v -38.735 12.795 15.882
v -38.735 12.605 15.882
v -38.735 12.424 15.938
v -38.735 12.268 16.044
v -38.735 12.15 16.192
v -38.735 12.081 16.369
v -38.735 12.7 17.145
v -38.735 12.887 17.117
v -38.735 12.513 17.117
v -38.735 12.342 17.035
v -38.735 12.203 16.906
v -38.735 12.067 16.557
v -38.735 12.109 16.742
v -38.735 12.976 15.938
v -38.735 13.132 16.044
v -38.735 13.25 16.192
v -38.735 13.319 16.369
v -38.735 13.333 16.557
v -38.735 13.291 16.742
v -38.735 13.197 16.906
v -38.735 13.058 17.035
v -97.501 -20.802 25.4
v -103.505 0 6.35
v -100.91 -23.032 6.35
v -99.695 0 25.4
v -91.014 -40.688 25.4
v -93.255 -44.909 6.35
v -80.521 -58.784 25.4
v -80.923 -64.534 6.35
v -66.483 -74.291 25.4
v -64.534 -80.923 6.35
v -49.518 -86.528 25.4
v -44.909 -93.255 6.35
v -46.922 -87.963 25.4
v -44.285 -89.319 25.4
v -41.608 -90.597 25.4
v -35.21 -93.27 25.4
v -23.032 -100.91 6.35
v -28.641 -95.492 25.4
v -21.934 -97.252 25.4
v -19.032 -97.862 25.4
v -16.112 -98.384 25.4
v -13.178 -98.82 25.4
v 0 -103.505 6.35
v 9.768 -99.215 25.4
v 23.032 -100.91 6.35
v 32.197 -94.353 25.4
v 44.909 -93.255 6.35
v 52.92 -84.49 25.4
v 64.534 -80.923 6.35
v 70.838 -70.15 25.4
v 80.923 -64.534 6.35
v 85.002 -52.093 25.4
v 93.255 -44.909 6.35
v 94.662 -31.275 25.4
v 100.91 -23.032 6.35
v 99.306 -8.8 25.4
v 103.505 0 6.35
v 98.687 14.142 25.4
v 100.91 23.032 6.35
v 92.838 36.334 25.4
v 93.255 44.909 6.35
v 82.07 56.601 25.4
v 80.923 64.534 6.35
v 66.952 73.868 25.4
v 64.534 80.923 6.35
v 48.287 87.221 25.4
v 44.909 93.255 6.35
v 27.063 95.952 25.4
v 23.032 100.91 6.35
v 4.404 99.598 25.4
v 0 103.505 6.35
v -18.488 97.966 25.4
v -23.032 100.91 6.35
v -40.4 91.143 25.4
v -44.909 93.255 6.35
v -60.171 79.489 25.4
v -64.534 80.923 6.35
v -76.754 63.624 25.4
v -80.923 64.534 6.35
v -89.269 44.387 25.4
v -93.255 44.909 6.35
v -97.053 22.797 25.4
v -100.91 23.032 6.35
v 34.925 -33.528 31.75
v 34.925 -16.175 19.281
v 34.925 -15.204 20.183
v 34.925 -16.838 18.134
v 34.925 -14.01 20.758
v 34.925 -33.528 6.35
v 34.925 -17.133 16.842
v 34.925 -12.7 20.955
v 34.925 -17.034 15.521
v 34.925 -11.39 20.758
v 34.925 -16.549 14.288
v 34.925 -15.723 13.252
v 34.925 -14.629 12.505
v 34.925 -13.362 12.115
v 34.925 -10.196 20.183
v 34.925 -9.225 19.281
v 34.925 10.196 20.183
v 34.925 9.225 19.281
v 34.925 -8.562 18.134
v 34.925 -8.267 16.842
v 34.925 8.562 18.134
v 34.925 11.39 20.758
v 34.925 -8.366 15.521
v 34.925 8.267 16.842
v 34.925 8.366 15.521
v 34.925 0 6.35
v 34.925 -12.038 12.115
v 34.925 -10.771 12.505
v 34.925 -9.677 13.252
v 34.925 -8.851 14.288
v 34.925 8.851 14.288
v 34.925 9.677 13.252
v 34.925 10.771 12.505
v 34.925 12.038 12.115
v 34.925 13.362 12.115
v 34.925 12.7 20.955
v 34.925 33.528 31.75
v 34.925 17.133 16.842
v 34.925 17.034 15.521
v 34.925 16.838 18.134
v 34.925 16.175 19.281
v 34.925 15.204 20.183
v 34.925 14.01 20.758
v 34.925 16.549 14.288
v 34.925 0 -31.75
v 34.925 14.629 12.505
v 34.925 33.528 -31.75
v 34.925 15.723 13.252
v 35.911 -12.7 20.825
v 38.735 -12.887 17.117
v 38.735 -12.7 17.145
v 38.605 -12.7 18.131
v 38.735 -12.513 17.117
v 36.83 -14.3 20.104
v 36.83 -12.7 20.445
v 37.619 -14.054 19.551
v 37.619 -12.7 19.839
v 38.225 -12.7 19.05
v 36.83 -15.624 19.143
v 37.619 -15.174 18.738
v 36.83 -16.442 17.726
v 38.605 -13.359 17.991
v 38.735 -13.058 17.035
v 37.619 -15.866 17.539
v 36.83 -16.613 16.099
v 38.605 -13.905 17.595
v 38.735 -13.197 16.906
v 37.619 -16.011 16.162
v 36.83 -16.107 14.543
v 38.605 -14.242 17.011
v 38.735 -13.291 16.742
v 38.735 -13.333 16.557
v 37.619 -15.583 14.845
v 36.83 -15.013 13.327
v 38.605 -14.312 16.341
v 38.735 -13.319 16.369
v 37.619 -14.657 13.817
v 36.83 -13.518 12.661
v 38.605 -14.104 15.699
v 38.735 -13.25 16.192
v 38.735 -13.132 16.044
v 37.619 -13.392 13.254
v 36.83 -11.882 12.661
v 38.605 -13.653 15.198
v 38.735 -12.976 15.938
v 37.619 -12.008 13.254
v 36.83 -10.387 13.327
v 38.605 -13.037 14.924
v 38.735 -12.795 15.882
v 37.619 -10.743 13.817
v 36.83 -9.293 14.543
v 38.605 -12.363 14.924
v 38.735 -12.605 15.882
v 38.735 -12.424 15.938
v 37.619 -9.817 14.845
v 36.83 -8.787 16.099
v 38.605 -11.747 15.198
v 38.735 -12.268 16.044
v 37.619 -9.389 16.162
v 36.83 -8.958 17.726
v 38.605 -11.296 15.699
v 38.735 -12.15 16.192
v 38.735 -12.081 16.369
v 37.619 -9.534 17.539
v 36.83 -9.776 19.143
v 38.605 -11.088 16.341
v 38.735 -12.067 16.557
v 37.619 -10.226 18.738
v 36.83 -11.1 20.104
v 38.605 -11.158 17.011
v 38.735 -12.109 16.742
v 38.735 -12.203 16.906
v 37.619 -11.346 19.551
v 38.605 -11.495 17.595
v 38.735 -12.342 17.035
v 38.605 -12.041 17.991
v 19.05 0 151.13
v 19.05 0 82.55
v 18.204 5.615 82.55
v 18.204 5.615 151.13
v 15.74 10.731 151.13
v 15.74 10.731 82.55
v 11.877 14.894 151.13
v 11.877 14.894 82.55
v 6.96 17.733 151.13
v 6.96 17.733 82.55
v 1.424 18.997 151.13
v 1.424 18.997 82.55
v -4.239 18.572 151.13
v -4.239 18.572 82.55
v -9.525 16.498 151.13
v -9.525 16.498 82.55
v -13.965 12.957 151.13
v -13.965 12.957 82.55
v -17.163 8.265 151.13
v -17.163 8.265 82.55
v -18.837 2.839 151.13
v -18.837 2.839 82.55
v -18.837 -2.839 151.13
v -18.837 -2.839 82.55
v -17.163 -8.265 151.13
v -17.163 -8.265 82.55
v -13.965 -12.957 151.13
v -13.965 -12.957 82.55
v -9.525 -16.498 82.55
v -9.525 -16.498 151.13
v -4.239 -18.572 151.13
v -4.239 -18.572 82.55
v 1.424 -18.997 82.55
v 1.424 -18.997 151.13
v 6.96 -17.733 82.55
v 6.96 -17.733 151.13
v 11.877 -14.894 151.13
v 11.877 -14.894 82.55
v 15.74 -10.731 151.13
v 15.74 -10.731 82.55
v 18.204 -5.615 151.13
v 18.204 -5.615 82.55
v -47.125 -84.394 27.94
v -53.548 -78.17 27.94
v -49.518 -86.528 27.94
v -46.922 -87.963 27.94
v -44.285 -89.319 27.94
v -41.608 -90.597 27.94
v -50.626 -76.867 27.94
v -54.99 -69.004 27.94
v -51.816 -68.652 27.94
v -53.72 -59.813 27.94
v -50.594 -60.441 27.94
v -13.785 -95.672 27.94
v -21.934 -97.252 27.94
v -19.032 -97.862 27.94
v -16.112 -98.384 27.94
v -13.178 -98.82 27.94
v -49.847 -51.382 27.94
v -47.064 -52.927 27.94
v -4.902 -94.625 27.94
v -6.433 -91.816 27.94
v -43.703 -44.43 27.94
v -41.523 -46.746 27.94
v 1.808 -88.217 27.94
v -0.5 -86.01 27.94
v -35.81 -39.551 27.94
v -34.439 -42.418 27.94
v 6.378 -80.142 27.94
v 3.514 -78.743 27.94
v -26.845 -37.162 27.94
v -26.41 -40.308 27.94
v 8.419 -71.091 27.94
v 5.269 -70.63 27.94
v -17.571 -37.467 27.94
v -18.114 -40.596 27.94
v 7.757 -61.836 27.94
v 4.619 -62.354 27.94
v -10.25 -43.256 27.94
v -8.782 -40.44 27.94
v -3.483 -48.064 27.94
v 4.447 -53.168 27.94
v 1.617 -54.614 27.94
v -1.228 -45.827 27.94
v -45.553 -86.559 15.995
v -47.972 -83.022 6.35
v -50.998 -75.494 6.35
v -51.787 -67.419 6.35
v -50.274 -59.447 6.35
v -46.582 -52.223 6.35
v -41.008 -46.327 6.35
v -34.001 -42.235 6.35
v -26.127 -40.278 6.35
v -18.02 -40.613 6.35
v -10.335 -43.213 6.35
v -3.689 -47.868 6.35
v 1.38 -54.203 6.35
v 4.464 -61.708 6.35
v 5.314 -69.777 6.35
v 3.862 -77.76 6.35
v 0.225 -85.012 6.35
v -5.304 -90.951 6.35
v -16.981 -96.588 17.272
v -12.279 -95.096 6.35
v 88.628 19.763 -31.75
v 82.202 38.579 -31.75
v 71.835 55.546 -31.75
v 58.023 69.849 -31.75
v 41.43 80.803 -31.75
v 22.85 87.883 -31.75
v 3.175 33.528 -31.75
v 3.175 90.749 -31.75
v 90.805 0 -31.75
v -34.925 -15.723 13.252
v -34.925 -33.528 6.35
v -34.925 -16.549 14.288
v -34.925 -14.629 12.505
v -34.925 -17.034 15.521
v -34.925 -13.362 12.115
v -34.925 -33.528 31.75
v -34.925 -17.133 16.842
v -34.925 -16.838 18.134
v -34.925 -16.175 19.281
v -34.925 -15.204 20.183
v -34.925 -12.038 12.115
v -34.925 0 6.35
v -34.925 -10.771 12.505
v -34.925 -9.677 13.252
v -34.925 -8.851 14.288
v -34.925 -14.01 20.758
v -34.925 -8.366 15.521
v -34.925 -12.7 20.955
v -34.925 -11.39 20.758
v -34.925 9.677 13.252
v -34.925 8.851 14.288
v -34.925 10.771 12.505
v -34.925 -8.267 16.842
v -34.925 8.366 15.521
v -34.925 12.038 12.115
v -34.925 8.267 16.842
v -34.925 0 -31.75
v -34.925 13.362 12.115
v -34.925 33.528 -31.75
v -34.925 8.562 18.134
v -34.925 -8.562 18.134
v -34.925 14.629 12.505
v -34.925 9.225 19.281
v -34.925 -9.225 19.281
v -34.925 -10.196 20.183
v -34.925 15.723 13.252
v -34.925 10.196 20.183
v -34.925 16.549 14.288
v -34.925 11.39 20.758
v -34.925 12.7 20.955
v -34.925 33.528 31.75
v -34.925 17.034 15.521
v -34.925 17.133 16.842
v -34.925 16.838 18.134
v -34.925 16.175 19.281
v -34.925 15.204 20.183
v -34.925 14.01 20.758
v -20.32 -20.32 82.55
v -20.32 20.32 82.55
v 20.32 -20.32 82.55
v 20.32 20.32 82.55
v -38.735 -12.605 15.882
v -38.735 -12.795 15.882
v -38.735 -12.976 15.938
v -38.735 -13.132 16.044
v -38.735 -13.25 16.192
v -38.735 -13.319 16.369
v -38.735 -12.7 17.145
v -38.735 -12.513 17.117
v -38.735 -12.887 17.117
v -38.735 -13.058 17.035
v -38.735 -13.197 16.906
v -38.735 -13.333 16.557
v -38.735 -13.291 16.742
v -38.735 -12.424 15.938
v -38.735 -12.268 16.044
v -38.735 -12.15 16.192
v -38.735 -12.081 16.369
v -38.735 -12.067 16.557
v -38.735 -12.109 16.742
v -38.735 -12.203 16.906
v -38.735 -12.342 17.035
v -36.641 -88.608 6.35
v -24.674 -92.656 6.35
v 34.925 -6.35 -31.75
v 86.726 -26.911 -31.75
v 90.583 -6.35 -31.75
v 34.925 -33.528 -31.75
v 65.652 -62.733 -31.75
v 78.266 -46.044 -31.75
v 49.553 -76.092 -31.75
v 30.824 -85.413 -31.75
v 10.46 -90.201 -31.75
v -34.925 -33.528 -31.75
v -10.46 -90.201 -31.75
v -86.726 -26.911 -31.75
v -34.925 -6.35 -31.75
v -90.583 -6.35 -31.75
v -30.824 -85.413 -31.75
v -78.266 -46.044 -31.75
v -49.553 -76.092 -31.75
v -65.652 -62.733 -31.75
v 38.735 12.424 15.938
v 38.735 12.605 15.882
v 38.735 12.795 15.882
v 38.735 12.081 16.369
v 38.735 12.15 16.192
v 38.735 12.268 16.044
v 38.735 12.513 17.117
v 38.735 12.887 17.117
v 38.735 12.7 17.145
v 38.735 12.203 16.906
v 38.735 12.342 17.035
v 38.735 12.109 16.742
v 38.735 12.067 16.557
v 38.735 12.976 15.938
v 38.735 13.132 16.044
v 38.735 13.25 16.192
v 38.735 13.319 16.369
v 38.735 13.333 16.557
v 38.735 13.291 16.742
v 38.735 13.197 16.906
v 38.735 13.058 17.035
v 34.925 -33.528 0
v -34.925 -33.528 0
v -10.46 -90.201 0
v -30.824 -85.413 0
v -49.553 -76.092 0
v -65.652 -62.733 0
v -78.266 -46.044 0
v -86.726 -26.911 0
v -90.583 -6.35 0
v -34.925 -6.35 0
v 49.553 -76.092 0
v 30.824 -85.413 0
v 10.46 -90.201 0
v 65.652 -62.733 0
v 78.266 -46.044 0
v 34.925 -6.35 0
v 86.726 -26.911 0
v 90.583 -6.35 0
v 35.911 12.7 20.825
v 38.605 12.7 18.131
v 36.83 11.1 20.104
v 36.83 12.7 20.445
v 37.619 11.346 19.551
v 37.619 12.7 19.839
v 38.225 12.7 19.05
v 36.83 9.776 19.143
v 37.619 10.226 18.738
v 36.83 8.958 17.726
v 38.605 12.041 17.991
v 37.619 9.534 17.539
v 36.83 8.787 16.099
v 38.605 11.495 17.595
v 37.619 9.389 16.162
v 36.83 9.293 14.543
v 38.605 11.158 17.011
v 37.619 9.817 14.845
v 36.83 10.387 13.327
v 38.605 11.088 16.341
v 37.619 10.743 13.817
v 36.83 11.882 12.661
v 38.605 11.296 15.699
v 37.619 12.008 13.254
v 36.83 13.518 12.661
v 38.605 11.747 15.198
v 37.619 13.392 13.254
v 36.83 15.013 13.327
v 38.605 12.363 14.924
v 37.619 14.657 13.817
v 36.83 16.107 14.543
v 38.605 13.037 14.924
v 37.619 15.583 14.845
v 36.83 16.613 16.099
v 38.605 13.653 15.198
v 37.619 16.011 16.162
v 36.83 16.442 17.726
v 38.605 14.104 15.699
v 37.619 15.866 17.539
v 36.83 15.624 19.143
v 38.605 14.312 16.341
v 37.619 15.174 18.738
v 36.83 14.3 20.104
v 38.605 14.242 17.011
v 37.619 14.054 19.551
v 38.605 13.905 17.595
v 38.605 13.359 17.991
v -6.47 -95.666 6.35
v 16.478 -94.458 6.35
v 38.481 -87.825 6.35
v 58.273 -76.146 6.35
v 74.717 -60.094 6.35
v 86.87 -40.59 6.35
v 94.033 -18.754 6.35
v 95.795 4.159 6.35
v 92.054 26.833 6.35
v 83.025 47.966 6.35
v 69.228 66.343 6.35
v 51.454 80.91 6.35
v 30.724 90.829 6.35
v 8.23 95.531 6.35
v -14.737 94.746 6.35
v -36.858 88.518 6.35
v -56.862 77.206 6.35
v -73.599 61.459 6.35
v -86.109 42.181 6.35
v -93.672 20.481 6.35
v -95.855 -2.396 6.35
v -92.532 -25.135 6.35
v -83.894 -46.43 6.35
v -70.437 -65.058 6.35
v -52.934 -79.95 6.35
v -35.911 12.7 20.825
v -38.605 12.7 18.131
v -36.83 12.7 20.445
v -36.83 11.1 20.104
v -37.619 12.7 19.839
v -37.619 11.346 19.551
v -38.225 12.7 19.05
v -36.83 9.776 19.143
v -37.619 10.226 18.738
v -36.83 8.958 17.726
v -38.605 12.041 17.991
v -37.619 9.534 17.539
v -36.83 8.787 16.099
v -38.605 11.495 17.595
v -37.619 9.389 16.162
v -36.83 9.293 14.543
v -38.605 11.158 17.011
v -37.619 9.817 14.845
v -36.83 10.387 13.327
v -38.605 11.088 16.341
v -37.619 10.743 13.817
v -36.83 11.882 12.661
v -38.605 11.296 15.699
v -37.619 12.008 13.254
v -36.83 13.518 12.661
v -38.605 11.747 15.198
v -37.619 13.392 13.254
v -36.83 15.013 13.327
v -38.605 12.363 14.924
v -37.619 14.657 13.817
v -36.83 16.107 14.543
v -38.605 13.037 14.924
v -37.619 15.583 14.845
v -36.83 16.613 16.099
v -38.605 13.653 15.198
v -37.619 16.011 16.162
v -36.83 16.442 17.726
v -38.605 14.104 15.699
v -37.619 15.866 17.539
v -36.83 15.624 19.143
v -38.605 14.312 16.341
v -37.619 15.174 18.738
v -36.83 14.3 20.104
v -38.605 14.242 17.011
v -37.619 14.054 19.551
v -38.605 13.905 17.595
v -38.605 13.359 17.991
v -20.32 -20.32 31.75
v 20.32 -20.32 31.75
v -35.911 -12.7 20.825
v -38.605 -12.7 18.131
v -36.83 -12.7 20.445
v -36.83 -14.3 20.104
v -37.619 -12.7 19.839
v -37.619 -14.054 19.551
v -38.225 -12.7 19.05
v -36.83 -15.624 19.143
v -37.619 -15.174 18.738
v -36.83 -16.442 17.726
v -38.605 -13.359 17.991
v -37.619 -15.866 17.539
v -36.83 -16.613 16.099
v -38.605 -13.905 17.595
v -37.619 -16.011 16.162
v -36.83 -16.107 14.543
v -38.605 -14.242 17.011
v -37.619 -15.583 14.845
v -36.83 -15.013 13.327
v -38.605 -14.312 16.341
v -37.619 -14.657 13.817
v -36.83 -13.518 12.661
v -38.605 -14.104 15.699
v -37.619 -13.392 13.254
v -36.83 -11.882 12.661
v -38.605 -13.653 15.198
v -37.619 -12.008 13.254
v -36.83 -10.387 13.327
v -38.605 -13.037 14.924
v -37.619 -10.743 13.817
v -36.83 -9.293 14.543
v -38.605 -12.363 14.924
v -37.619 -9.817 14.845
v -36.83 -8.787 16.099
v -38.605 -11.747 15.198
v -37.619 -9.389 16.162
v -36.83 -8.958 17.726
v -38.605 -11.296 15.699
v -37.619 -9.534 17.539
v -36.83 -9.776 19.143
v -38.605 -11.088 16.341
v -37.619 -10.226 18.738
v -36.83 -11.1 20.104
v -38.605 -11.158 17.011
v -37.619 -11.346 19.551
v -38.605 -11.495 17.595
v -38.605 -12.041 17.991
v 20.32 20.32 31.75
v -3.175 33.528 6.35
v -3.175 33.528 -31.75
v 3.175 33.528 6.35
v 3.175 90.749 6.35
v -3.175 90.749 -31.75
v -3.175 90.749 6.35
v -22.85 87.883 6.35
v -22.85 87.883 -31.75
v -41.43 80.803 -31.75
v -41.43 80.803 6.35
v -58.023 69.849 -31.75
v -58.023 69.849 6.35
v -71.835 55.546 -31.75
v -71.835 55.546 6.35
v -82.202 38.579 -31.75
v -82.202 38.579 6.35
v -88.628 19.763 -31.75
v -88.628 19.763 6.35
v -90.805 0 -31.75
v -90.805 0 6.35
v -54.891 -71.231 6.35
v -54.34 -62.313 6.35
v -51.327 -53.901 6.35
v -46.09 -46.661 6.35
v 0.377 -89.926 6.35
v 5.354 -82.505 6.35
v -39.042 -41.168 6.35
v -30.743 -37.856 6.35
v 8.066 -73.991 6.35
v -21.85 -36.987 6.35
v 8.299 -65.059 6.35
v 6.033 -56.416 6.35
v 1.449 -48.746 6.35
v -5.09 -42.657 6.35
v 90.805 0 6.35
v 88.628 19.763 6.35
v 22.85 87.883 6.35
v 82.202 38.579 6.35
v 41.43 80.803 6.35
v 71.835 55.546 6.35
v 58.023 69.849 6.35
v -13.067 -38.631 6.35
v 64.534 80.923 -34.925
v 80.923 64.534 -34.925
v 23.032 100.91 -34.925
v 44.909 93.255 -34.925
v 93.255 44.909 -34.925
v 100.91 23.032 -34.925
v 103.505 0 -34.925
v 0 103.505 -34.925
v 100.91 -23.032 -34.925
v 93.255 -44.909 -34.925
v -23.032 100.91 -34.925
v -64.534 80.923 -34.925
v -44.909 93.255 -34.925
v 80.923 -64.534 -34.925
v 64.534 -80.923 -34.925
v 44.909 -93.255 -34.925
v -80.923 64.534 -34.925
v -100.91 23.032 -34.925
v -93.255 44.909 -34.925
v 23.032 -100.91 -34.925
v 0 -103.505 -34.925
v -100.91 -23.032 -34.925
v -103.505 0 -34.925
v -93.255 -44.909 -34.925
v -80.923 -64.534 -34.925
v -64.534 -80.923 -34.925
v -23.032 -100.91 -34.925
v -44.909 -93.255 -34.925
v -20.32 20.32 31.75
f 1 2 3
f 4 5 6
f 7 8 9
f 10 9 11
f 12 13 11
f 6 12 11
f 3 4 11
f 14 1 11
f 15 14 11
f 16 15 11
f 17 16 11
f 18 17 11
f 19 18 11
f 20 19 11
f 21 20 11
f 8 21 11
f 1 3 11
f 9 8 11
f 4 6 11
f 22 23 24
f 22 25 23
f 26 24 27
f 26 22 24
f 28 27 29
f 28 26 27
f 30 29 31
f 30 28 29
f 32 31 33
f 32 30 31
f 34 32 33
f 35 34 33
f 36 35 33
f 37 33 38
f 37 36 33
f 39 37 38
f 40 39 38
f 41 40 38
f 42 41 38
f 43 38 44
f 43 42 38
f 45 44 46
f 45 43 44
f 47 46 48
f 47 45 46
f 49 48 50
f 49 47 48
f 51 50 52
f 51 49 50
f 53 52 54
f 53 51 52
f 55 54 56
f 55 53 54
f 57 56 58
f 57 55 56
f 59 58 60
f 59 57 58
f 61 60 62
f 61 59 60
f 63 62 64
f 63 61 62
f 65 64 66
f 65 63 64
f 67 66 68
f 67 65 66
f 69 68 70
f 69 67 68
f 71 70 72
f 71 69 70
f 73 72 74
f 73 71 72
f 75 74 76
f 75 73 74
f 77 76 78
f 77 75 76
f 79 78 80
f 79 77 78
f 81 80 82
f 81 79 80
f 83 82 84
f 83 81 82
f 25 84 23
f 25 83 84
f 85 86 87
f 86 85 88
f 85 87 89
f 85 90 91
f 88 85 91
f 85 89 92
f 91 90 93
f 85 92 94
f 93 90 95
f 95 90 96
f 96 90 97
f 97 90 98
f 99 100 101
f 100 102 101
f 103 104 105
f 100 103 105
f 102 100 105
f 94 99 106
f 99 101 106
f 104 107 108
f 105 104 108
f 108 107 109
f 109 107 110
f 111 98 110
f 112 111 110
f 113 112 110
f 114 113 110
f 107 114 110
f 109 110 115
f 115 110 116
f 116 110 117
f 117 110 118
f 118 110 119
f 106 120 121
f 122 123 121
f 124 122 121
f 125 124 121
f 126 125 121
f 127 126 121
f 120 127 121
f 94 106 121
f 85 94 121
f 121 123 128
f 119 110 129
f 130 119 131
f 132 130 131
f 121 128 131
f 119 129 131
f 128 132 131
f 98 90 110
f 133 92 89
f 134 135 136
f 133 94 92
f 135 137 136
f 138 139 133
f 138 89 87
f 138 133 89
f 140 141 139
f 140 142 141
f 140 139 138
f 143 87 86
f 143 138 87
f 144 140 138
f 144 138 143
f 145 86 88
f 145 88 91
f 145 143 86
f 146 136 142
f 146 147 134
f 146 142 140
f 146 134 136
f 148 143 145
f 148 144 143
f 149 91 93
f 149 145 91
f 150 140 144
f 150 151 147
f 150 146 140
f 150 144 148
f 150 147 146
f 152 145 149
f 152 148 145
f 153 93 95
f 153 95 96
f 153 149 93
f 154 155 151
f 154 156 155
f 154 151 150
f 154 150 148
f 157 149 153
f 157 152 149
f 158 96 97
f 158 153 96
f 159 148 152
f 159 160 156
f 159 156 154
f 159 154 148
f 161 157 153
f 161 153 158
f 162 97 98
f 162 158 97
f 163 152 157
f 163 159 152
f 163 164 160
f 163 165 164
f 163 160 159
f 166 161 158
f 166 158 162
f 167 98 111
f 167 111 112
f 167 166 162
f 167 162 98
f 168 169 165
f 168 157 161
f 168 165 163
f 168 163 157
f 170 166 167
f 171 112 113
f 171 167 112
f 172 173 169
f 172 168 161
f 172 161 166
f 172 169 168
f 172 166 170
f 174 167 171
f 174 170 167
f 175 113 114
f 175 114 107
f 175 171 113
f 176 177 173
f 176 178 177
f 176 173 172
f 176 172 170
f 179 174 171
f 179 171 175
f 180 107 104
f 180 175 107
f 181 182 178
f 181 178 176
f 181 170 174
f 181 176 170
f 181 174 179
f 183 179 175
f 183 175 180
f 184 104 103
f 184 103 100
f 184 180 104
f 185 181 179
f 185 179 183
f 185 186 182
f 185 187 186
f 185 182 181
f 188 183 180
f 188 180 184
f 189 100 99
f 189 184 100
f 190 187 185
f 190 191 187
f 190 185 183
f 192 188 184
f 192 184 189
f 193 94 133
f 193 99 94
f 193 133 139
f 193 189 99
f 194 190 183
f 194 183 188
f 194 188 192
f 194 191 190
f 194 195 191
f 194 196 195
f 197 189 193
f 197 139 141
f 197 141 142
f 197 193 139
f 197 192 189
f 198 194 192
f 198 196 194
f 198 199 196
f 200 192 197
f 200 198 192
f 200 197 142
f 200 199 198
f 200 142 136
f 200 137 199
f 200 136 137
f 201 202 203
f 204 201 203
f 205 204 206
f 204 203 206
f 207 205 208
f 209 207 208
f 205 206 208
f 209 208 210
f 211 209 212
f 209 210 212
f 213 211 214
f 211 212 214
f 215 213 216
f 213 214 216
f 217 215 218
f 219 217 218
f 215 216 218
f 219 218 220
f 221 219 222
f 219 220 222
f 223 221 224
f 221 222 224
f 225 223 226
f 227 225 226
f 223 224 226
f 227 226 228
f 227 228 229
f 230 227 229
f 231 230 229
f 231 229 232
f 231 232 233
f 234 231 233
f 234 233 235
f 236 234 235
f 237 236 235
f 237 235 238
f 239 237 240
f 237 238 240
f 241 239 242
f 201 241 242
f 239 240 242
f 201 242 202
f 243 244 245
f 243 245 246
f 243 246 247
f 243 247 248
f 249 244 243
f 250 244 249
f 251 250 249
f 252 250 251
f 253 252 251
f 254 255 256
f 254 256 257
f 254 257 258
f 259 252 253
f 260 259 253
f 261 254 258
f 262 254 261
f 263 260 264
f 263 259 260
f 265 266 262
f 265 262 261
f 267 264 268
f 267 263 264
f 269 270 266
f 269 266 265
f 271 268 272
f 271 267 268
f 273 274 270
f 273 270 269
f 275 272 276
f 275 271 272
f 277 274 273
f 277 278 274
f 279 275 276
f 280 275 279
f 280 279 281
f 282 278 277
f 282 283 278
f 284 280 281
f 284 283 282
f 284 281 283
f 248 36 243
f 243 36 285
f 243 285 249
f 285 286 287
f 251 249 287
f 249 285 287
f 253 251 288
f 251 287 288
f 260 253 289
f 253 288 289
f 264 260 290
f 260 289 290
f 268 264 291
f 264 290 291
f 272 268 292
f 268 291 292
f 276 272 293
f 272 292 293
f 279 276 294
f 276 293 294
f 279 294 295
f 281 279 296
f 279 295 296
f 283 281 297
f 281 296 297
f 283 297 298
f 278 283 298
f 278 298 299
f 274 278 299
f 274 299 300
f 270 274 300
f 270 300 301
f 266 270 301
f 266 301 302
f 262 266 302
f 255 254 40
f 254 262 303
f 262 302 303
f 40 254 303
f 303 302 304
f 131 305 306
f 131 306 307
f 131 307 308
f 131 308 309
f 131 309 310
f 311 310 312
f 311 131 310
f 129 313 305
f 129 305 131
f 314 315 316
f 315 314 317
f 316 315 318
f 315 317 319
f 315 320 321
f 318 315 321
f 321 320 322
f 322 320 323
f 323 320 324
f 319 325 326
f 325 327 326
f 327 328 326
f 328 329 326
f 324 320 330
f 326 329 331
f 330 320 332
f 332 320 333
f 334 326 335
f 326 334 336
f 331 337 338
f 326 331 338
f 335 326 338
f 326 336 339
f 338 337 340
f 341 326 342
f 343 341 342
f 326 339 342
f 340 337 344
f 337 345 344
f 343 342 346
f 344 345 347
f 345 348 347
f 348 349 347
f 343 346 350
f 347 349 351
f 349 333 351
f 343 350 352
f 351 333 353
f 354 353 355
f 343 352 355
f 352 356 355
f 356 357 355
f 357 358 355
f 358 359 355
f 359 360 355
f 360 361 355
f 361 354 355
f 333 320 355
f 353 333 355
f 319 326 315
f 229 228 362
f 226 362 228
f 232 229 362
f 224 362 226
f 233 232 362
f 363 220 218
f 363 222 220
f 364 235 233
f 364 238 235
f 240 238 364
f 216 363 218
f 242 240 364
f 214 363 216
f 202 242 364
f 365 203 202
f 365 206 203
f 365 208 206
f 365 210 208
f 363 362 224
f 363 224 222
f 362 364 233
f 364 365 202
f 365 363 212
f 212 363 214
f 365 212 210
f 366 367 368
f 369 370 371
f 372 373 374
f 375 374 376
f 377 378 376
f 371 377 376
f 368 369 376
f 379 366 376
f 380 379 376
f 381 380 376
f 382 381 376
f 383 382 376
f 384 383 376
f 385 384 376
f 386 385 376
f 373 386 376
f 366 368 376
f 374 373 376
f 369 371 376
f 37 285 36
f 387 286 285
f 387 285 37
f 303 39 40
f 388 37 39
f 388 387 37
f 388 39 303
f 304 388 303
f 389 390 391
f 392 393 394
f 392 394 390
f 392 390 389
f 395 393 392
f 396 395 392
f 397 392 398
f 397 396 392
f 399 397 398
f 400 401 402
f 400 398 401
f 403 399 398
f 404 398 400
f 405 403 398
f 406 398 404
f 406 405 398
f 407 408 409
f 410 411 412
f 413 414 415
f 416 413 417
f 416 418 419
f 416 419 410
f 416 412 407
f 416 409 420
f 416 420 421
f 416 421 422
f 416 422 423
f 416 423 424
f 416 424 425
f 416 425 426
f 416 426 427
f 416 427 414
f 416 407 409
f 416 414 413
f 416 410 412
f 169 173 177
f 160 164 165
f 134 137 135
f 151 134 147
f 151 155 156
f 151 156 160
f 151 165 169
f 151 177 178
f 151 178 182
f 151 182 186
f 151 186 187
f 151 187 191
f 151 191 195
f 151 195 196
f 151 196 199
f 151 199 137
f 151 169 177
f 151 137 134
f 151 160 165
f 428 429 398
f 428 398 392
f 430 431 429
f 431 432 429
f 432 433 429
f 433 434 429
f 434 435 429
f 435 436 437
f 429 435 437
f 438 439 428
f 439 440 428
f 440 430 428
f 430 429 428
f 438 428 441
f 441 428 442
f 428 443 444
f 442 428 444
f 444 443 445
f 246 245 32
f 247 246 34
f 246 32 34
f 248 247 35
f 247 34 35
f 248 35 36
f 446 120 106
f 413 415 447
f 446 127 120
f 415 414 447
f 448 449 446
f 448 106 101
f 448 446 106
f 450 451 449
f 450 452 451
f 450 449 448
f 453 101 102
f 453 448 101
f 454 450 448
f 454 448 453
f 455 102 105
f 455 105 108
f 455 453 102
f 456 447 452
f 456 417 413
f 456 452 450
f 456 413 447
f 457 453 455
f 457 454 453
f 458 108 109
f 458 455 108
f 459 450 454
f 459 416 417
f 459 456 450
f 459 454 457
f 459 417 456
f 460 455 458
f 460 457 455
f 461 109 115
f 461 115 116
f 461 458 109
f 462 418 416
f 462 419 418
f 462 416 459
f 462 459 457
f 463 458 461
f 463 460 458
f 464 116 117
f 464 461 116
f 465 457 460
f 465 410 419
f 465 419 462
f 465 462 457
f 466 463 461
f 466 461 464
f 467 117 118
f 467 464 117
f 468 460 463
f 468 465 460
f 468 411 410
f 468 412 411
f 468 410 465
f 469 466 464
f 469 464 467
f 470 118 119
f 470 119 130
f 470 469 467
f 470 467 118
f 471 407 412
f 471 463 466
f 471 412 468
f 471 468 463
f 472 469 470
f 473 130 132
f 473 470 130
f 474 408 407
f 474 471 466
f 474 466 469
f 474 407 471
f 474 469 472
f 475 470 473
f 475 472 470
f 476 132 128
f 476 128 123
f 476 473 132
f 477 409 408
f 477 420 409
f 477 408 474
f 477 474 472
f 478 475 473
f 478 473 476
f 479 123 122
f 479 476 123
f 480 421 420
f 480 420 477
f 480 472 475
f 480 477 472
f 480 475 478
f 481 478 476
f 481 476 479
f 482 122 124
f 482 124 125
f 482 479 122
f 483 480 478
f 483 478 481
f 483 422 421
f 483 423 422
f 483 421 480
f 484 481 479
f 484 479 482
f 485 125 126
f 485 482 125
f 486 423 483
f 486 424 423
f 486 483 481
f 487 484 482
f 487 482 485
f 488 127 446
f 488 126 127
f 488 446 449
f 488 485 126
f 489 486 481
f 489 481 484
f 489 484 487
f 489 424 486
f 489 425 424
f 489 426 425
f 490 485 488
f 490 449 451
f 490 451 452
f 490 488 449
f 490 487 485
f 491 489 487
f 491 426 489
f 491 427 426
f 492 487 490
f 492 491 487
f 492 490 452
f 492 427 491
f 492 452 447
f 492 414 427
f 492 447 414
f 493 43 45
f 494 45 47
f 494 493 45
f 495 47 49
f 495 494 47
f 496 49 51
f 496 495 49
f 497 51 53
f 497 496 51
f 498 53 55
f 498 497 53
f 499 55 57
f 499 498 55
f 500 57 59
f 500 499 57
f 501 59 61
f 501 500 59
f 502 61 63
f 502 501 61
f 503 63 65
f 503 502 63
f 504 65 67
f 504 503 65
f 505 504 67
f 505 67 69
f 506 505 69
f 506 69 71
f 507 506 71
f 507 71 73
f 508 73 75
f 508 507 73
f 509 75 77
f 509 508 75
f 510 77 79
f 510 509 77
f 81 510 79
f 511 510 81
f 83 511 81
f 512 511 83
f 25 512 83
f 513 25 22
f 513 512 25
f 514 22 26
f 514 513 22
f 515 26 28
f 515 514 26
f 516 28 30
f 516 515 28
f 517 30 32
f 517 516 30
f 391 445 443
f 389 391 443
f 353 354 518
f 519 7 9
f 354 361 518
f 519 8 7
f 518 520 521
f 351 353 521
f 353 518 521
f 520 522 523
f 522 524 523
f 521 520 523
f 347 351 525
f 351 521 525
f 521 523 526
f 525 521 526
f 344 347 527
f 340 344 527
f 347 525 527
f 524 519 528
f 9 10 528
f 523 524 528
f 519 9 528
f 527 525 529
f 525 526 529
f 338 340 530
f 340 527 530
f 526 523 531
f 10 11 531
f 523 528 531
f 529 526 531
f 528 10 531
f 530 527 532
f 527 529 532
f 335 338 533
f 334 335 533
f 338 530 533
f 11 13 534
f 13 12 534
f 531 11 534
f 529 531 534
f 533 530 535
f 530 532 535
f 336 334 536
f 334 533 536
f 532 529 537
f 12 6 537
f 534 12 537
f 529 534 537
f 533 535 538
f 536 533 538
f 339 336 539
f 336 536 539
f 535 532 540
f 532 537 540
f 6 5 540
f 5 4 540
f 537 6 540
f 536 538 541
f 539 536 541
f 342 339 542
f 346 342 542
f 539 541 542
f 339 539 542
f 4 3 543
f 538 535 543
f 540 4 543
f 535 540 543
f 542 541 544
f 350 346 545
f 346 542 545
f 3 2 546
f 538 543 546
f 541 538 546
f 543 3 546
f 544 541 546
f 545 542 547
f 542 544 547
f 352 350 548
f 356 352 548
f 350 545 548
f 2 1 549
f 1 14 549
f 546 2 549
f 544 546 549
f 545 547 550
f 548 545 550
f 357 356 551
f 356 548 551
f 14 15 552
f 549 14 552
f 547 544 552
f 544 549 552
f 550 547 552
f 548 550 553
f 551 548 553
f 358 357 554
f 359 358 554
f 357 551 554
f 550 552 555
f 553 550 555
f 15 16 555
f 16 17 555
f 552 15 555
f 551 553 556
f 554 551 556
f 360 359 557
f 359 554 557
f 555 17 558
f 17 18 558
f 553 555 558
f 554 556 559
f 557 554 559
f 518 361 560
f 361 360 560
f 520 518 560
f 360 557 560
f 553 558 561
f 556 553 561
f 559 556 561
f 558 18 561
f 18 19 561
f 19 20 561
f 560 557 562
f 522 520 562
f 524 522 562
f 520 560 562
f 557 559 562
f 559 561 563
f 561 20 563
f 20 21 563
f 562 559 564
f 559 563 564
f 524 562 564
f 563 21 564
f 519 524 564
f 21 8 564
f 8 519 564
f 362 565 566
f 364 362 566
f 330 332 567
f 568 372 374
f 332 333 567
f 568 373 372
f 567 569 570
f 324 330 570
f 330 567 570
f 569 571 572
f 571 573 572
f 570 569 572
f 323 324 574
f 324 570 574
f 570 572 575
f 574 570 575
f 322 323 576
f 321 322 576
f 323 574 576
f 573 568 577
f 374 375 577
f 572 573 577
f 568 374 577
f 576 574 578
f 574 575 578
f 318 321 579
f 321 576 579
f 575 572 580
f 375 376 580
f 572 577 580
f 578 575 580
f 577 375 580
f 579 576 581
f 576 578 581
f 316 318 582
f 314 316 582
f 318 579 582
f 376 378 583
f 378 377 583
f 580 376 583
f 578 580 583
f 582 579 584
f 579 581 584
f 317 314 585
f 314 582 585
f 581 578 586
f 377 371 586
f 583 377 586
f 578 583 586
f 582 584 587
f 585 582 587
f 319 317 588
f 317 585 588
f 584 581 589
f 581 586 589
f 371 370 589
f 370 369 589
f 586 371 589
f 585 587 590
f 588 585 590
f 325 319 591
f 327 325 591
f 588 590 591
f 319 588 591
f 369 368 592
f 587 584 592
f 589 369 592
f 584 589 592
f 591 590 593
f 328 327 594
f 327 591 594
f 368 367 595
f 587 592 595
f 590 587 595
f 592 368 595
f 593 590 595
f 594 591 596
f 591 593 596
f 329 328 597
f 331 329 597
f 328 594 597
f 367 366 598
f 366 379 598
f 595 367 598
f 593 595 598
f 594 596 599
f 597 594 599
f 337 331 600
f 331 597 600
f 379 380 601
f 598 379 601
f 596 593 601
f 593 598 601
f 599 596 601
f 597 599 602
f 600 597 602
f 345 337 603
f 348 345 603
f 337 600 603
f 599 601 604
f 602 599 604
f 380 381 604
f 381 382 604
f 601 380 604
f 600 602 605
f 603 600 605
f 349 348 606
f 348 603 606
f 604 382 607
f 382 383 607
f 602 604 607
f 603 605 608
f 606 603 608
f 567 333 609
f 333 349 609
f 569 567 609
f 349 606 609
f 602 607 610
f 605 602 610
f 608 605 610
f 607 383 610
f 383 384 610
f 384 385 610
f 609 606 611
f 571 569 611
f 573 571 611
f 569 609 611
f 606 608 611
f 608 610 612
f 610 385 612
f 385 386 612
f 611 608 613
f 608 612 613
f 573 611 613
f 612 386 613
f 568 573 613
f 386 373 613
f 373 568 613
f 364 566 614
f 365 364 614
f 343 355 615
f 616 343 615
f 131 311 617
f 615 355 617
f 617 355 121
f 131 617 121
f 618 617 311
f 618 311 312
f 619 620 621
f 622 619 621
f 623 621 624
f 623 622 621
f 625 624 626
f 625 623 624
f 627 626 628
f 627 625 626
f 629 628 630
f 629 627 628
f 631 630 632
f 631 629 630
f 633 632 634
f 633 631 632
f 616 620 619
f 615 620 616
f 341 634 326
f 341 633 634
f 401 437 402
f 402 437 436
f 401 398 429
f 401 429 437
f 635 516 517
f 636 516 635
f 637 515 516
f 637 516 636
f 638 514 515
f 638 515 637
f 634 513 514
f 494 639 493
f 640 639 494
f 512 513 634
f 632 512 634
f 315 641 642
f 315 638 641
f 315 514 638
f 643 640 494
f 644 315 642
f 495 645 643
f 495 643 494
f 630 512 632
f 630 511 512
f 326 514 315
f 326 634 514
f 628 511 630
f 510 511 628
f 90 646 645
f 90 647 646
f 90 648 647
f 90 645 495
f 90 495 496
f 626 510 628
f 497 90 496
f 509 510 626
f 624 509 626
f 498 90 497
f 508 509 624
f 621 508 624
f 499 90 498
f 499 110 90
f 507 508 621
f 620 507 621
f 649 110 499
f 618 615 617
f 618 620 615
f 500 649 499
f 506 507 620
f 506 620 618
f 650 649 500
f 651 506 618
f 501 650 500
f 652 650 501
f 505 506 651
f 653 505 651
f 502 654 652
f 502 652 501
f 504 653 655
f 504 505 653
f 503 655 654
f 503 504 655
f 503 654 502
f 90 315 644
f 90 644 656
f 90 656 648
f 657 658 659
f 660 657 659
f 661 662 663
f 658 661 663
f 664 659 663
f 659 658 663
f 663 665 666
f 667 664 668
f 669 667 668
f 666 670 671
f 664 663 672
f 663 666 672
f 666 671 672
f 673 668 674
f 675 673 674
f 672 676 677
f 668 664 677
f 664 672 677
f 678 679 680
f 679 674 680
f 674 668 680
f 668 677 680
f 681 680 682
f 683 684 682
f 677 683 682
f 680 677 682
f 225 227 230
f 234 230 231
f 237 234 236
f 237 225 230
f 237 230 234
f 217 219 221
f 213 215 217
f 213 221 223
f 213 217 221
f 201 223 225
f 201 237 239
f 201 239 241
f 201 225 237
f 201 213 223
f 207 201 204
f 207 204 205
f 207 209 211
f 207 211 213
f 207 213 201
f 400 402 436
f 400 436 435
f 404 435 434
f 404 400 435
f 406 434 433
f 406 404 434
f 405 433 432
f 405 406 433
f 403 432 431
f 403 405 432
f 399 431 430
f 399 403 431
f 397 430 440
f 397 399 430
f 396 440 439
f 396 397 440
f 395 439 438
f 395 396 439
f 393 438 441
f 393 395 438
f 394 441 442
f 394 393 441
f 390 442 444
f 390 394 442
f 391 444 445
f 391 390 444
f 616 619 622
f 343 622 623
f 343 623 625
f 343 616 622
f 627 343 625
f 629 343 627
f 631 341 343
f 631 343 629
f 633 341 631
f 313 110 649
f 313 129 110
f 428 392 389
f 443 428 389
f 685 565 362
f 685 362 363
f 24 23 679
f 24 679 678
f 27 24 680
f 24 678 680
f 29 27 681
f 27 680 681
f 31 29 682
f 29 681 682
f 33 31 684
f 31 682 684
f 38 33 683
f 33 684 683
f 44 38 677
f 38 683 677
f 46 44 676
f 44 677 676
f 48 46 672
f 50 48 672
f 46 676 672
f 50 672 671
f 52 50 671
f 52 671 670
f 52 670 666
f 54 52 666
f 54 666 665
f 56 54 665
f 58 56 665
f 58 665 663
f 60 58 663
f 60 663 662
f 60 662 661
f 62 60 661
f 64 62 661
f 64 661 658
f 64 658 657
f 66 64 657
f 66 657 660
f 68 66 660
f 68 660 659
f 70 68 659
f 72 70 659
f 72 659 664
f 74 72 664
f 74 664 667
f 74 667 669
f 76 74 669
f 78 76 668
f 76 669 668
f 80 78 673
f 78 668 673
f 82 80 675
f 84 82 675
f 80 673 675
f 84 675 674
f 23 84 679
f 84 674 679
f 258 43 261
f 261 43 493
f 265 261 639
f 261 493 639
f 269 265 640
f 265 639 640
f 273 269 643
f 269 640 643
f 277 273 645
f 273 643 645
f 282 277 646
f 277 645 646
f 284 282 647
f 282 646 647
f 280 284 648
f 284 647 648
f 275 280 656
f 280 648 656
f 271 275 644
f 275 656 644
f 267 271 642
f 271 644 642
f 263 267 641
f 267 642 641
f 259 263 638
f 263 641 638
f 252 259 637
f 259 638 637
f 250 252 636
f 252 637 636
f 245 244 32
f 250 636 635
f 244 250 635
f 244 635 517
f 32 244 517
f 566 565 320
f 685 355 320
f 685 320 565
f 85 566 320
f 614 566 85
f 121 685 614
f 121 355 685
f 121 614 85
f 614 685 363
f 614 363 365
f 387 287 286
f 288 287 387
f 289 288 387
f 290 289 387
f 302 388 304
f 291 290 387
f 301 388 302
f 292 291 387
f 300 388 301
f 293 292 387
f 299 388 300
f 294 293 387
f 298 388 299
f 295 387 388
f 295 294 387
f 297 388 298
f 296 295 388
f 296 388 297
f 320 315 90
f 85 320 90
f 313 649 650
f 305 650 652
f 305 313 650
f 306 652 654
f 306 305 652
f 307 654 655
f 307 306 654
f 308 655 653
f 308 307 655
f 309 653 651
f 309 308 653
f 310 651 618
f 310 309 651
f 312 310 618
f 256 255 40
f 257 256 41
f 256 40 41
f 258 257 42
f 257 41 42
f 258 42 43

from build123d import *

# Parameters (mm, degrees)
BOSS_EXTRUDE1_DEPTH  = 6.35
SKETCH1_W            = 69.85
SKETCH1_H            = 67.056
BOSS_EXTRUDE2_DEPTH  = 31.75
SKETCH3_R            = 103.505
SKETCH3_R_2          = 90.805
BOSS_EXTRUDE3_DEPTH  = 38.1
BOSS_EXTRUDE4_START  = -3.175
SKETCH3_2_R          = 103.505
BOSS_EXTRUDE4_DEPTH  = 3.175
BOSS_EXTRUDE5_REACH  = 154.086
SKETCH1_3_W          = 69.85
SKETCH1_3_H          = 67.056
BOSS_EXTRUDE6_DEPTH  = 31.75
BOSS_EXTRUDE7_DEPTH  = 21.59
SKETCH8_R            = 4.445
BOSS_EXTRUDE8_DEPTH  = 3.81
FILLET1_R            = 3.81
FILLET1_OF_MIRROR3_R = 3.81
SKETCH9_W            = 40.64
SKETCH9_H            = 40.64
BOSS_EXTRUDE9_DEPTH  = 50.8
SKETCH10_R           = 19.05
BOSS_EXTRUDE10_DEPTH = 68.58


with BuildPart() as part:
    # Sketch2 → Boss-Extrude1 (new body)
    with BuildSketch(Plane.XY):
        with BuildLine():
            Line((-90.805, 0), (-34.925, 0))
            Line((-34.925, 0), (-34.925, -33.528))
            Line((-34.925, -33.528), (34.925, -33.528))
            Line((34.925, -33.528), (34.925, 0))
            Line((34.925, 0), (90.805, 0))
            ThreePointArc((90.805, 0), (0, -90.805), (-90.805, 0))
        make_face()
    extrude(amount=BOSS_EXTRUDE1_DEPTH)

    # Sketch1 → Boss-Extrude2 (add)
    with BuildSketch(Plane.XY):
        Rectangle(SKETCH1_W, SKETCH1_H)
    extrude(amount=BOSS_EXTRUDE2_DEPTH)

    # Sketch3 → Boss-Extrude3 (add)
    with BuildSketch(Plane.XY.offset(-31.75)):
        with Locations(Location((0, 0, 0), (0, 0, 180))):
            Circle(SKETCH3_R)
        Circle(SKETCH3_R_2, mode=Mode.SUBTRACT)
    extrude(amount=BOSS_EXTRUDE3_DEPTH)

    # Sketch3<2> → Boss-Extrude4 (add)
    with BuildSketch(Plane.XY.offset(-31.75).offset(BOSS_EXTRUDE4_START)):
        with Locations(Location((0, 0, 0), (0, 0, 180))):
            Circle(SKETCH3_2_R)
    extrude(amount=BOSS_EXTRUDE4_DEPTH)

    # Boss-Extrude5: up to this face of the body (flat: up to its plane)
    boss_extrude5_end = Plane(part.part.faces().sort_by_distance((0, 0, -31.75))[0])
    # Sketch5 → Boss-Extrude5 (add, up to the picked face)
    with BuildSketch(Plane.XY.offset(6.35), mode=Mode.PRIVATE) as boss_extrude5_sk1:
        with BuildLine():
            Line((-90.805, 0), (-34.925, 0))
            Line((-34.925, 0), (-34.925, -6.35))
            Line((-34.925, -6.35), (-90.582699921, -6.35))
            ThreePointArc((-90.582699921, -6.35), (-90.749407963, -3.176944968), (-90.805, 0))
        make_face()
    boss_extrude5_tool1 = split(extrude(boss_extrude5_sk1.sketch, amount=-BOSS_EXTRUDE5_REACH, mode=Mode.PRIVATE), bisect_by=boss_extrude5_end, keep=Keep.BOTH, mode=Mode.PRIVATE)
    # Sketch5 → Boss-Extrude5 (add, up to the picked face)
    with BuildSketch(Plane.XY.offset(6.35), mode=Mode.PRIVATE) as boss_extrude5_sk2:
        with BuildLine():
            Line((34.925, 0), (90.805, 0))
            ThreePointArc((90.805, 0), (90.749407963, -3.176944968), (90.582699921, -6.35))
            Line((90.582699921, -6.35), (34.925, -6.35))
            Line((34.925, -6.35), (34.925, 0))
        make_face()
    boss_extrude5_tool2 = split(extrude(boss_extrude5_sk2.sketch, amount=-BOSS_EXTRUDE5_REACH, mode=Mode.PRIVATE), bisect_by=boss_extrude5_end, keep=Keep.BOTH, mode=Mode.PRIVATE)
    # Sketch5 → Boss-Extrude5 (add, up to the picked face)
    with BuildSketch(Plane.XY.offset(6.35), mode=Mode.PRIVATE) as boss_extrude5_sk3:
        Polygon((0, 33.528), (3.175, 33.528), (3.175, 94.488), (-3.175, 94.488), (-3.175, 33.528), align=None)
    boss_extrude5_tool3 = split(extrude(boss_extrude5_sk3.sketch, amount=-BOSS_EXTRUDE5_REACH, mode=Mode.PRIVATE), bisect_by=boss_extrude5_end, keep=Keep.BOTH, mode=Mode.PRIVATE)
    add(boss_extrude5_tool1.solids().sort_by(Axis((-62.828007, -3.172893, 6.35), (0, 0, -1)))[0])
    add(boss_extrude5_tool2.solids().sort_by(Axis((62.828007, -3.172893, 6.35), (0, 0, -1)))[0])
    add(boss_extrude5_tool3.solids().sort_by(Axis((0, 64.008, 6.35), (0, 0, -1)))[0])

    # Sketch1<3> → Boss-Extrude6 (add)
    with BuildSketch(Plane.XY):
        Rectangle(SKETCH1_3_W, SKETCH1_3_H)
    extrude(amount=-BOSS_EXTRUDE6_DEPTH)

    # Sketch6 → Revolve1 (revolve)
    with BuildSketch(Plane(origin=(0, 0, 0), x_dir=(1, 0, 0), z_dir=(0, 1, 0))):
        Polygon((-103.505, -6.35), (-99.695, -25.4), (-95.885, -6.35), align=None)
    revolve(axis=Axis((0, 0, 0), (0, 0, 1)))

    # Sketch7 → Boss-Extrude7 (add)
    with BuildSketch(Plane.XY.offset(6.35)):
        with BuildLine():
            ThreePointArc((-13.17823844, -98.820175352), (-13.067443237, -38.631075363), (-49.51802331, -86.527789712))
            ThreePointArc((-49.51802331, -86.527789712), (-45.608408723, -88.650809803), (-41.607971429, -90.597294323))
            ThreePointArc((-41.607971429, -90.597294323), (-14.084798914, -41.638667826), (-21.934434586, -97.252113624))
            ThreePointArc((-21.934434586, -97.252113624), (-17.573834418, -98.133854346), (-13.17823844, -98.820175352))
        make_face()
    extrude(amount=BOSS_EXTRUDE7_DEPTH)

    # Sketch8 → Boss-Extrude8 (add)
    with BuildSketch(Plane(origin=(34.925, 0, 0), x_dir=(0, 0, -1), z_dir=(1, 0, 0))):
        with Locations(Location((-16.51, 12.7, 0), (0, 0, 180))):
            Circle(SKETCH8_R)
        with Locations(Location((-16.51, -12.7, 0), (0, 0, 180))):
            Circle(SKETCH8_R)
    boss_extrude8 = extrude(amount=BOSS_EXTRUDE8_DEPTH)

    # Fillet1
    fillet1_edges = [part.edges().sort_by_distance(p)[0] for p in [
        (38.735, 12.7, 12.065),
        (38.735, -12.7, 12.065),
    ]]
    fillet(fillet1_edges, radius=FILLET1_R - 0.0001)  # a hair under: the kernel refuses the full size

    # Mirror3: Boss-Extrude8 across plane
    add(boss_extrude8.mirror(Plane(origin=(0, 0, 0), x_dir=(0, 0, 1), z_dir=(1, 0, 0))))

    # Fillet1 of Mirror3
    fillet1_of_mirror3_edges = [part.edges().sort_by_distance(p)[0] for p in [
        (-38.735, 12.7, 12.065),
        (-38.735, -12.7, 12.065),
    ]]
    fillet(fillet1_of_mirror3_edges, radius=FILLET1_OF_MIRROR3_R - 0.0001)  # a hair under: the kernel refuses the full size

    # Sketch9 → Boss-Extrude9 (add)
    with BuildSketch(Plane.XY.offset(31.75)):
        Rectangle(SKETCH9_W, SKETCH9_H)
    extrude(amount=BOSS_EXTRUDE9_DEPTH)

    # Sketch10 → Boss-Extrude10 (add)
    with BuildSketch(Plane.XY.offset(82.55)):
        Circle(SKETCH10_R)
    extrude(amount=BOSS_EXTRUDE10_DEPTH)


solid = part.part
